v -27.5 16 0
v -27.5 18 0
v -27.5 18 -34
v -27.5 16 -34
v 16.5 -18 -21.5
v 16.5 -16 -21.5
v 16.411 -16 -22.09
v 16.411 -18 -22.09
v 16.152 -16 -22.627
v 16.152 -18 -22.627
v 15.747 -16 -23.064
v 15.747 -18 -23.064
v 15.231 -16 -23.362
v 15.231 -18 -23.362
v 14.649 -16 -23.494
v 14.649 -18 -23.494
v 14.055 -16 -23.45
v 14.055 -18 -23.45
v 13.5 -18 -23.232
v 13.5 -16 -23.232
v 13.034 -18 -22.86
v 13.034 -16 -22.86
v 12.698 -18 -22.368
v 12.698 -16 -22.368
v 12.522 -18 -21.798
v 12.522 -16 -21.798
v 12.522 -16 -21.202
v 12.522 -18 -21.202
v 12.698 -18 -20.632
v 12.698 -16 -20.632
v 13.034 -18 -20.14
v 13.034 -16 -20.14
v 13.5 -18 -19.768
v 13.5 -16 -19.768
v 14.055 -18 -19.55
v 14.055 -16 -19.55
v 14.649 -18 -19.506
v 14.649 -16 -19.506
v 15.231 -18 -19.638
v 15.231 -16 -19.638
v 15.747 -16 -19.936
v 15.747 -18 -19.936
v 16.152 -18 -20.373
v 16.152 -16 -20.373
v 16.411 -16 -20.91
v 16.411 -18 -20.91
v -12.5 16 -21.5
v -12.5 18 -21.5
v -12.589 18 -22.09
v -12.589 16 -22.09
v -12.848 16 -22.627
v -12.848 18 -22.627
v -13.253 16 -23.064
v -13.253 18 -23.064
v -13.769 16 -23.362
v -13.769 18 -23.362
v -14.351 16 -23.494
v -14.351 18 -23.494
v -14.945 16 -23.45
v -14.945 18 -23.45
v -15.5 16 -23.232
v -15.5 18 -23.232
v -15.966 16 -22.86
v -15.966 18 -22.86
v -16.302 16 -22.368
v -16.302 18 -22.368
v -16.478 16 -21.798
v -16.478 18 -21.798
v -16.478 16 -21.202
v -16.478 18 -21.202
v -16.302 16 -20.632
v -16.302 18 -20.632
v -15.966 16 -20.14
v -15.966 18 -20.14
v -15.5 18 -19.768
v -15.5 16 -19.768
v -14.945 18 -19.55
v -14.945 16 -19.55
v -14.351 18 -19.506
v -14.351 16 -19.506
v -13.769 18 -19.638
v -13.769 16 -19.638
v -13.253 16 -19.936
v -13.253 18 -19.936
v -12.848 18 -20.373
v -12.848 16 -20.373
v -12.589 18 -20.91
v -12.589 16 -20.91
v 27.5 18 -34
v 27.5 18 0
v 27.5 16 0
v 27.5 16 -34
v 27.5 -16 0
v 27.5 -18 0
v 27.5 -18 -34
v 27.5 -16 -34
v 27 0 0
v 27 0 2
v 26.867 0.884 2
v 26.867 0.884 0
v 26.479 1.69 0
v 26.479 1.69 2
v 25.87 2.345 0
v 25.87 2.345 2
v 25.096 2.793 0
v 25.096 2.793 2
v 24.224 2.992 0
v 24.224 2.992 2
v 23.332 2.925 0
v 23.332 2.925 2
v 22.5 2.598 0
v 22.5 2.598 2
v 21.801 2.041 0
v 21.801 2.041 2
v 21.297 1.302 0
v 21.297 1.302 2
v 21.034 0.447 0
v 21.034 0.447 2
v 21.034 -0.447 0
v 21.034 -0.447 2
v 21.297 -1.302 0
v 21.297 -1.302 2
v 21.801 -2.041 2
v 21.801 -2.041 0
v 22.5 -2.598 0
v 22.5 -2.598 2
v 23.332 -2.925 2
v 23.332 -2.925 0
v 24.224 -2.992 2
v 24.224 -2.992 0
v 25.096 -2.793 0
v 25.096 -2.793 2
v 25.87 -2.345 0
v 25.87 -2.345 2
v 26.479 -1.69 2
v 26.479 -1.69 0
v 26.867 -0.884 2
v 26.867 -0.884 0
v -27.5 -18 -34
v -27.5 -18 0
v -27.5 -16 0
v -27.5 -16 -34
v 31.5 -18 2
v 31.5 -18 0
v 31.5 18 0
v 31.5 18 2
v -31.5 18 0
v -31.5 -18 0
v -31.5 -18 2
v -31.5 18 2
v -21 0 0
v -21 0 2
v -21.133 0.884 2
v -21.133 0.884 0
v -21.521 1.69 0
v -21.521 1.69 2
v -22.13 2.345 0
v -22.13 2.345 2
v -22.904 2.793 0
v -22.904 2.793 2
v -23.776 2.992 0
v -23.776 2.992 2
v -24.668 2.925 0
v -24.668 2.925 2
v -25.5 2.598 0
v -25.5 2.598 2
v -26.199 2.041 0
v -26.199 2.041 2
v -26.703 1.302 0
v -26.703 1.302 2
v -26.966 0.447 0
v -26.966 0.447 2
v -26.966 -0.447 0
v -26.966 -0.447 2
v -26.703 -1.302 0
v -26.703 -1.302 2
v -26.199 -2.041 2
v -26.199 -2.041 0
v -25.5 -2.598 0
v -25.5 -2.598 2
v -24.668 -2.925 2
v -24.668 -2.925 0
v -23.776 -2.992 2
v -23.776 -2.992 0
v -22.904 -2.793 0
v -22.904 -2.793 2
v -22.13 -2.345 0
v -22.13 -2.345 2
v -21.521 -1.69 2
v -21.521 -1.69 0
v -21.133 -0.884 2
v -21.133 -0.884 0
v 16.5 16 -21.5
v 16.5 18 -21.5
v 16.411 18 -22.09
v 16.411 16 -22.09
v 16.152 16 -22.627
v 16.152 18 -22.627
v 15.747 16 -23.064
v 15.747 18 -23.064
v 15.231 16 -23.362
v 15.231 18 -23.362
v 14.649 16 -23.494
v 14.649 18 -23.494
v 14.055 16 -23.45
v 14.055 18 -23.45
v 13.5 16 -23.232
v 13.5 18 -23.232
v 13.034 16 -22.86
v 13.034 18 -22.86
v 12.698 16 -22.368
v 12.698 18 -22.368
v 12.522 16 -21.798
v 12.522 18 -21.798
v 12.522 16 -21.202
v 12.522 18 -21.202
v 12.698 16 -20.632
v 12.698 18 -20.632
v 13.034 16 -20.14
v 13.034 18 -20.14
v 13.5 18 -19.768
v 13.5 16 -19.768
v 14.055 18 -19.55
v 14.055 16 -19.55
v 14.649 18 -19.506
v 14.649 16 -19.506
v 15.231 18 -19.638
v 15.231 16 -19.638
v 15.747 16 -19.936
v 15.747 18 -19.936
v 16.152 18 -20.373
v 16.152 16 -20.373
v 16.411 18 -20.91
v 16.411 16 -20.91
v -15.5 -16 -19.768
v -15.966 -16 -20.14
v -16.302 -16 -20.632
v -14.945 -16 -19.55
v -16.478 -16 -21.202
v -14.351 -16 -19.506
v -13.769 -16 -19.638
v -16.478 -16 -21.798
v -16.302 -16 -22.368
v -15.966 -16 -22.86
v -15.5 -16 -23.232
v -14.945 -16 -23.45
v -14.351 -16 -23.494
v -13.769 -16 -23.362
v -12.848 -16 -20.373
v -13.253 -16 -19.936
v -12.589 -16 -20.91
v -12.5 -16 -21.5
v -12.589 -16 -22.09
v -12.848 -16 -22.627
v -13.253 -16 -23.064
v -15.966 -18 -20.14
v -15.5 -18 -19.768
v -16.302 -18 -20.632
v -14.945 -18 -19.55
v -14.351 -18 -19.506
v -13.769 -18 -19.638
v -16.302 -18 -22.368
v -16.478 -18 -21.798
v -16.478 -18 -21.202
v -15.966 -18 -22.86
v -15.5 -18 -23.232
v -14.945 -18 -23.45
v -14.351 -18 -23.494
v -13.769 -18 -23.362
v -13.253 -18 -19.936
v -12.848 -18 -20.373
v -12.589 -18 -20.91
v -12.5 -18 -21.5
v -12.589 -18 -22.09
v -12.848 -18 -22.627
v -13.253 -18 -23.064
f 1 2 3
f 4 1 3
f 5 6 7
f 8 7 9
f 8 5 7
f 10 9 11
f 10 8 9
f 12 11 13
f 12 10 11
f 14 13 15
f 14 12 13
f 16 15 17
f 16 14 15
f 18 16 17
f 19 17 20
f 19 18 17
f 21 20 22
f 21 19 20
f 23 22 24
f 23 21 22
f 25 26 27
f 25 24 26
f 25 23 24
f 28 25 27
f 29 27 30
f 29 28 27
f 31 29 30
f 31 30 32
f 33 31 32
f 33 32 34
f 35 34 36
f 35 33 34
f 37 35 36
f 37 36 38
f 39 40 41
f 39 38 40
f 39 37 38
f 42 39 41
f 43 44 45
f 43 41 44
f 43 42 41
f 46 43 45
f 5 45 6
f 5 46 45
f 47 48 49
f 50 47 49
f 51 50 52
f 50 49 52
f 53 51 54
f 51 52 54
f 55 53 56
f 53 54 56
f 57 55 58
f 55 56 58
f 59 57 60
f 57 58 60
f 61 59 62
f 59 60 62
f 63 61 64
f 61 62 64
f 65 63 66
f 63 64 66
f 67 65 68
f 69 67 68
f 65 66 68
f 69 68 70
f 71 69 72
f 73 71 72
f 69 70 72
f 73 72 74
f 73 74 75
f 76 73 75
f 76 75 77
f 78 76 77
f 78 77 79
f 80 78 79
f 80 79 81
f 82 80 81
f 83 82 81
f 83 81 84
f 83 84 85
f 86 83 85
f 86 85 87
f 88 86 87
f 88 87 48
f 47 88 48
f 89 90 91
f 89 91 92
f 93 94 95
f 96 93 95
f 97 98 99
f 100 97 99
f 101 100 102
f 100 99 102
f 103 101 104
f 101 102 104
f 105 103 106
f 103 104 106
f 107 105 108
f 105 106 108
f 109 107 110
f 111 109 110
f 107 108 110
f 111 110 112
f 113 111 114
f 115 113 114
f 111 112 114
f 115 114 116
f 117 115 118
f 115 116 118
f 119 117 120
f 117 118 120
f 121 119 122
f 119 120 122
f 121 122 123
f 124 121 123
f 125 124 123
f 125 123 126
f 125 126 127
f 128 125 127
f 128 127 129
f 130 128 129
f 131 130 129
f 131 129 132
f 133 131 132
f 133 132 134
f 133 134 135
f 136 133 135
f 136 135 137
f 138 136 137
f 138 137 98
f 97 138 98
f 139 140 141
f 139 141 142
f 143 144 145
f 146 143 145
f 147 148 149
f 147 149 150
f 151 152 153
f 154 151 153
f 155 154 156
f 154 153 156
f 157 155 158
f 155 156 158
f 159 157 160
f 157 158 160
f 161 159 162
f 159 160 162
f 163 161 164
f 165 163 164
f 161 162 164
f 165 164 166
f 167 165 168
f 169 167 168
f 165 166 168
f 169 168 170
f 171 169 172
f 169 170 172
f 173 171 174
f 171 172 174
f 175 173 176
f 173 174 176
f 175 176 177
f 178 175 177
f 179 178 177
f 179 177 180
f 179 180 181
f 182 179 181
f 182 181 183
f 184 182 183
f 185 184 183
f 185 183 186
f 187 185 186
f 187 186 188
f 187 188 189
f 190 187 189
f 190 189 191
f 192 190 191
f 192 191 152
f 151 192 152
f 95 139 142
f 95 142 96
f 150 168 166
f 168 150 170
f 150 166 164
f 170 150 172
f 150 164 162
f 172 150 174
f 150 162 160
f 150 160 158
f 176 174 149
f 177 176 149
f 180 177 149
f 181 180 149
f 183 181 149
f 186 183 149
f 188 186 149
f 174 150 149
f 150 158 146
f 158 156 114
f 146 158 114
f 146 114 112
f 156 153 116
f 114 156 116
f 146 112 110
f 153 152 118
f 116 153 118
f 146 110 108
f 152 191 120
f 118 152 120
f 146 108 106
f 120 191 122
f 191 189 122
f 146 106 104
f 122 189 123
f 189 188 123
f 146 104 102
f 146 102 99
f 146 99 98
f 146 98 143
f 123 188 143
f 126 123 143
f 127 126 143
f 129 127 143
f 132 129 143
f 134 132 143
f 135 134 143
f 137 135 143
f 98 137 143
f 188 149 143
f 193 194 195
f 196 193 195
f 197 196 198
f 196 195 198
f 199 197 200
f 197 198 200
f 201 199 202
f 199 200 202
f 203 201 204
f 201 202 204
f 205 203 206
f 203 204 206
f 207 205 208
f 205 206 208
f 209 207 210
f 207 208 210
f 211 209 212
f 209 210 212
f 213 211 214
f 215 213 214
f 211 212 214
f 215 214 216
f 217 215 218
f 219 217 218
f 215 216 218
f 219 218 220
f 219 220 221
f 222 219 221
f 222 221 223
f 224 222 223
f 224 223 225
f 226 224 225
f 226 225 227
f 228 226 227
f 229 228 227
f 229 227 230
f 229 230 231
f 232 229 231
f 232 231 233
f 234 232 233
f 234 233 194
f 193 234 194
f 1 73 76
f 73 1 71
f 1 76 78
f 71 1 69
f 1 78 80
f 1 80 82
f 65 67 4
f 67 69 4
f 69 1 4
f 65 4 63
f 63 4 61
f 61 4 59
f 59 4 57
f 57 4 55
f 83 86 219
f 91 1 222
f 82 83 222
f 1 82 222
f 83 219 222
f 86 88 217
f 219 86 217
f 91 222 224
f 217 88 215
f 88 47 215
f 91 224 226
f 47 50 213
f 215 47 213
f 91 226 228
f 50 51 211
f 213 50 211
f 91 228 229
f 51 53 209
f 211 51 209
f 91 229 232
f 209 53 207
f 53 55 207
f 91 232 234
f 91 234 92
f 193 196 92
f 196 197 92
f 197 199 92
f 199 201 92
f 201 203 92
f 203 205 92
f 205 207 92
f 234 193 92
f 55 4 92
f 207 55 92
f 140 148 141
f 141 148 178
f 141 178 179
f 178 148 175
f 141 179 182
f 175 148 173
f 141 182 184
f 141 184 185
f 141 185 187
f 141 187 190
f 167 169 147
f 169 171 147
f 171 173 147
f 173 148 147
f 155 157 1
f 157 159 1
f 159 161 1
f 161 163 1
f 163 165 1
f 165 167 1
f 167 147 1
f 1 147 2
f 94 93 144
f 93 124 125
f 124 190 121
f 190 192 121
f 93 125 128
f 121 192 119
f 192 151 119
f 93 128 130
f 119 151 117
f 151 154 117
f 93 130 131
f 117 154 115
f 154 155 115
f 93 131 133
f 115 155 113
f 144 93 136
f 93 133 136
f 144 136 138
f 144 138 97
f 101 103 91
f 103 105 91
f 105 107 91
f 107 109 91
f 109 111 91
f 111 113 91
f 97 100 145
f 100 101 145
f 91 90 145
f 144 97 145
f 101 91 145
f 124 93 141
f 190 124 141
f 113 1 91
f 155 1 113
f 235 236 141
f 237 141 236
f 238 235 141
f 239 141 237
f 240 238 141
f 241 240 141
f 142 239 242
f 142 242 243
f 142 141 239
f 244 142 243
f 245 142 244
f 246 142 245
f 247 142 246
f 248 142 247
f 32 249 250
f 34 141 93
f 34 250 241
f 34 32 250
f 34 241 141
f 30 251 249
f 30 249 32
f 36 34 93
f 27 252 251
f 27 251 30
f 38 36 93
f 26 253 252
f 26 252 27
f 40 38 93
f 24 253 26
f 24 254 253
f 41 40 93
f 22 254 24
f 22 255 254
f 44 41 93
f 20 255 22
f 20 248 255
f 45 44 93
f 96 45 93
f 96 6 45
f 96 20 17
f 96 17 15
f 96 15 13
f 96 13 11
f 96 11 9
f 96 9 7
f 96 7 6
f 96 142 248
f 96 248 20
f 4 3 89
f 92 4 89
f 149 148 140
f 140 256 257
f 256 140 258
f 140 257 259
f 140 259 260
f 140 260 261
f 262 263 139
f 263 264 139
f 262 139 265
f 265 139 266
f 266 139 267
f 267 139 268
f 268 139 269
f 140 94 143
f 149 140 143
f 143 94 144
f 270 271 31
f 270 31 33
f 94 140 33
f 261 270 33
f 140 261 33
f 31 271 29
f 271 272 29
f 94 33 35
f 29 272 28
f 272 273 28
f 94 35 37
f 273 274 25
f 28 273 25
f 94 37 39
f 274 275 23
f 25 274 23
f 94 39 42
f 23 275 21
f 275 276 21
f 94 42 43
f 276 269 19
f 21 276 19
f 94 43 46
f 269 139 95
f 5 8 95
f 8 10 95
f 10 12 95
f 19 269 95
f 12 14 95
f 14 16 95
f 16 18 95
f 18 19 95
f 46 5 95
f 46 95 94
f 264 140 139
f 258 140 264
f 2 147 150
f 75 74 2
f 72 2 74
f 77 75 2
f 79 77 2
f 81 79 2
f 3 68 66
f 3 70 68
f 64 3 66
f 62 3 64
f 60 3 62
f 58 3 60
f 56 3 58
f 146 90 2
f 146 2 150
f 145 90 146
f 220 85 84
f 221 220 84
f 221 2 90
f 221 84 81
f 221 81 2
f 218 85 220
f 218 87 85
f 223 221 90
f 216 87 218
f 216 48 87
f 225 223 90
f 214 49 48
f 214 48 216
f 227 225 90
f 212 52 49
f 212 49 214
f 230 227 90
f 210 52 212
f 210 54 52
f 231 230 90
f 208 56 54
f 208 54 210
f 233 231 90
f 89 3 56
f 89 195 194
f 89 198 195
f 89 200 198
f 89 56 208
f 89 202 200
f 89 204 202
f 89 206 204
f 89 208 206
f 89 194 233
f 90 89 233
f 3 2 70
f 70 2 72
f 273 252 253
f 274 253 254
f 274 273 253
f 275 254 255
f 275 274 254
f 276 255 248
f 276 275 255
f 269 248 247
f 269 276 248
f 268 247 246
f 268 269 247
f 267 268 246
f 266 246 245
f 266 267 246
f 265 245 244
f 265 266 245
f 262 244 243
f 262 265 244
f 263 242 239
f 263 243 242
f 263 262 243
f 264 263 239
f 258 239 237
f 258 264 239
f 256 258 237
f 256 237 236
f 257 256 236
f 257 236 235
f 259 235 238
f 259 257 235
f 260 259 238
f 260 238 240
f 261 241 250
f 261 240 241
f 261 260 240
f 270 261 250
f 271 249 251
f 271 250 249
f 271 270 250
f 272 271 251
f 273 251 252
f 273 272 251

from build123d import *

# Parameters (mm, degrees)
SKETCH_1_W          = 63
SKETCH_1_H          = 36
EXTRUDE_1_DEPTH     = 2
SKETCH_2_R          = 3
CUT_EXTRUDE_1_DEPTH = 10
SKETCH_4_W          = 55
SKETCH_4_H          = 36
EXTRUDE_2_DEPTH     = 2
SKETCH_5_R          = 2
CUT_EXTRUDE_2_DEPTH = 37


with BuildPart() as part:
    # 草图1 → 凸台-拉伸1 (new body)
    with BuildSketch(Plane.XY):
        Rectangle(SKETCH_1_W, SKETCH_1_H)
    extrude(amount=EXTRUDE_1_DEPTH)

    # 草图2 → 切除-拉伸1 (cut)
    with BuildSketch(Plane.XY.offset(2)):
        with Locations((-24, 0)):
            Circle(SKETCH_2_R)
        with Locations((24, 0)):
            Circle(SKETCH_2_R)
    extrude(amount=-CUT_EXTRUDE_1_DEPTH, mode=Mode.SUBTRACT)

    # 草图4 → 凸台-拉伸2 (add)
    with BuildSketch(Plane(origin=(0, 18, 0), x_dir=(1, 0, 0), z_dir=(0, 1, 0))):
        with Locations((0, 16)):
            Rectangle(SKETCH_4_W, SKETCH_4_H)
    extrude_2 = extrude(amount=-EXTRUDE_2_DEPTH)

    # 草图5 → 切除-拉伸2 (cut, through all)
    with BuildSketch(Plane(origin=(0, 18, 0), x_dir=(1, 0, 0), z_dir=(0, 1, 0))):
        with Locations((-14.5, 21.5)):
            Circle(SKETCH_5_R)
        with Locations((14.5, 21.5)):
            Circle(SKETCH_5_R)
    cut_extrude_2 = extrude(amount=-CUT_EXTRUDE_2_DEPTH, mode=Mode.SUBTRACT)

    # 镜向1: 凸台-拉伸2, 切除-拉伸2 across plane
    add(extrude_2.mirror(Plane.ZX))
    add(cut_extrude_2.mirror(Plane.ZX), mode=Mode.SUBTRACT)


solid = part.part
